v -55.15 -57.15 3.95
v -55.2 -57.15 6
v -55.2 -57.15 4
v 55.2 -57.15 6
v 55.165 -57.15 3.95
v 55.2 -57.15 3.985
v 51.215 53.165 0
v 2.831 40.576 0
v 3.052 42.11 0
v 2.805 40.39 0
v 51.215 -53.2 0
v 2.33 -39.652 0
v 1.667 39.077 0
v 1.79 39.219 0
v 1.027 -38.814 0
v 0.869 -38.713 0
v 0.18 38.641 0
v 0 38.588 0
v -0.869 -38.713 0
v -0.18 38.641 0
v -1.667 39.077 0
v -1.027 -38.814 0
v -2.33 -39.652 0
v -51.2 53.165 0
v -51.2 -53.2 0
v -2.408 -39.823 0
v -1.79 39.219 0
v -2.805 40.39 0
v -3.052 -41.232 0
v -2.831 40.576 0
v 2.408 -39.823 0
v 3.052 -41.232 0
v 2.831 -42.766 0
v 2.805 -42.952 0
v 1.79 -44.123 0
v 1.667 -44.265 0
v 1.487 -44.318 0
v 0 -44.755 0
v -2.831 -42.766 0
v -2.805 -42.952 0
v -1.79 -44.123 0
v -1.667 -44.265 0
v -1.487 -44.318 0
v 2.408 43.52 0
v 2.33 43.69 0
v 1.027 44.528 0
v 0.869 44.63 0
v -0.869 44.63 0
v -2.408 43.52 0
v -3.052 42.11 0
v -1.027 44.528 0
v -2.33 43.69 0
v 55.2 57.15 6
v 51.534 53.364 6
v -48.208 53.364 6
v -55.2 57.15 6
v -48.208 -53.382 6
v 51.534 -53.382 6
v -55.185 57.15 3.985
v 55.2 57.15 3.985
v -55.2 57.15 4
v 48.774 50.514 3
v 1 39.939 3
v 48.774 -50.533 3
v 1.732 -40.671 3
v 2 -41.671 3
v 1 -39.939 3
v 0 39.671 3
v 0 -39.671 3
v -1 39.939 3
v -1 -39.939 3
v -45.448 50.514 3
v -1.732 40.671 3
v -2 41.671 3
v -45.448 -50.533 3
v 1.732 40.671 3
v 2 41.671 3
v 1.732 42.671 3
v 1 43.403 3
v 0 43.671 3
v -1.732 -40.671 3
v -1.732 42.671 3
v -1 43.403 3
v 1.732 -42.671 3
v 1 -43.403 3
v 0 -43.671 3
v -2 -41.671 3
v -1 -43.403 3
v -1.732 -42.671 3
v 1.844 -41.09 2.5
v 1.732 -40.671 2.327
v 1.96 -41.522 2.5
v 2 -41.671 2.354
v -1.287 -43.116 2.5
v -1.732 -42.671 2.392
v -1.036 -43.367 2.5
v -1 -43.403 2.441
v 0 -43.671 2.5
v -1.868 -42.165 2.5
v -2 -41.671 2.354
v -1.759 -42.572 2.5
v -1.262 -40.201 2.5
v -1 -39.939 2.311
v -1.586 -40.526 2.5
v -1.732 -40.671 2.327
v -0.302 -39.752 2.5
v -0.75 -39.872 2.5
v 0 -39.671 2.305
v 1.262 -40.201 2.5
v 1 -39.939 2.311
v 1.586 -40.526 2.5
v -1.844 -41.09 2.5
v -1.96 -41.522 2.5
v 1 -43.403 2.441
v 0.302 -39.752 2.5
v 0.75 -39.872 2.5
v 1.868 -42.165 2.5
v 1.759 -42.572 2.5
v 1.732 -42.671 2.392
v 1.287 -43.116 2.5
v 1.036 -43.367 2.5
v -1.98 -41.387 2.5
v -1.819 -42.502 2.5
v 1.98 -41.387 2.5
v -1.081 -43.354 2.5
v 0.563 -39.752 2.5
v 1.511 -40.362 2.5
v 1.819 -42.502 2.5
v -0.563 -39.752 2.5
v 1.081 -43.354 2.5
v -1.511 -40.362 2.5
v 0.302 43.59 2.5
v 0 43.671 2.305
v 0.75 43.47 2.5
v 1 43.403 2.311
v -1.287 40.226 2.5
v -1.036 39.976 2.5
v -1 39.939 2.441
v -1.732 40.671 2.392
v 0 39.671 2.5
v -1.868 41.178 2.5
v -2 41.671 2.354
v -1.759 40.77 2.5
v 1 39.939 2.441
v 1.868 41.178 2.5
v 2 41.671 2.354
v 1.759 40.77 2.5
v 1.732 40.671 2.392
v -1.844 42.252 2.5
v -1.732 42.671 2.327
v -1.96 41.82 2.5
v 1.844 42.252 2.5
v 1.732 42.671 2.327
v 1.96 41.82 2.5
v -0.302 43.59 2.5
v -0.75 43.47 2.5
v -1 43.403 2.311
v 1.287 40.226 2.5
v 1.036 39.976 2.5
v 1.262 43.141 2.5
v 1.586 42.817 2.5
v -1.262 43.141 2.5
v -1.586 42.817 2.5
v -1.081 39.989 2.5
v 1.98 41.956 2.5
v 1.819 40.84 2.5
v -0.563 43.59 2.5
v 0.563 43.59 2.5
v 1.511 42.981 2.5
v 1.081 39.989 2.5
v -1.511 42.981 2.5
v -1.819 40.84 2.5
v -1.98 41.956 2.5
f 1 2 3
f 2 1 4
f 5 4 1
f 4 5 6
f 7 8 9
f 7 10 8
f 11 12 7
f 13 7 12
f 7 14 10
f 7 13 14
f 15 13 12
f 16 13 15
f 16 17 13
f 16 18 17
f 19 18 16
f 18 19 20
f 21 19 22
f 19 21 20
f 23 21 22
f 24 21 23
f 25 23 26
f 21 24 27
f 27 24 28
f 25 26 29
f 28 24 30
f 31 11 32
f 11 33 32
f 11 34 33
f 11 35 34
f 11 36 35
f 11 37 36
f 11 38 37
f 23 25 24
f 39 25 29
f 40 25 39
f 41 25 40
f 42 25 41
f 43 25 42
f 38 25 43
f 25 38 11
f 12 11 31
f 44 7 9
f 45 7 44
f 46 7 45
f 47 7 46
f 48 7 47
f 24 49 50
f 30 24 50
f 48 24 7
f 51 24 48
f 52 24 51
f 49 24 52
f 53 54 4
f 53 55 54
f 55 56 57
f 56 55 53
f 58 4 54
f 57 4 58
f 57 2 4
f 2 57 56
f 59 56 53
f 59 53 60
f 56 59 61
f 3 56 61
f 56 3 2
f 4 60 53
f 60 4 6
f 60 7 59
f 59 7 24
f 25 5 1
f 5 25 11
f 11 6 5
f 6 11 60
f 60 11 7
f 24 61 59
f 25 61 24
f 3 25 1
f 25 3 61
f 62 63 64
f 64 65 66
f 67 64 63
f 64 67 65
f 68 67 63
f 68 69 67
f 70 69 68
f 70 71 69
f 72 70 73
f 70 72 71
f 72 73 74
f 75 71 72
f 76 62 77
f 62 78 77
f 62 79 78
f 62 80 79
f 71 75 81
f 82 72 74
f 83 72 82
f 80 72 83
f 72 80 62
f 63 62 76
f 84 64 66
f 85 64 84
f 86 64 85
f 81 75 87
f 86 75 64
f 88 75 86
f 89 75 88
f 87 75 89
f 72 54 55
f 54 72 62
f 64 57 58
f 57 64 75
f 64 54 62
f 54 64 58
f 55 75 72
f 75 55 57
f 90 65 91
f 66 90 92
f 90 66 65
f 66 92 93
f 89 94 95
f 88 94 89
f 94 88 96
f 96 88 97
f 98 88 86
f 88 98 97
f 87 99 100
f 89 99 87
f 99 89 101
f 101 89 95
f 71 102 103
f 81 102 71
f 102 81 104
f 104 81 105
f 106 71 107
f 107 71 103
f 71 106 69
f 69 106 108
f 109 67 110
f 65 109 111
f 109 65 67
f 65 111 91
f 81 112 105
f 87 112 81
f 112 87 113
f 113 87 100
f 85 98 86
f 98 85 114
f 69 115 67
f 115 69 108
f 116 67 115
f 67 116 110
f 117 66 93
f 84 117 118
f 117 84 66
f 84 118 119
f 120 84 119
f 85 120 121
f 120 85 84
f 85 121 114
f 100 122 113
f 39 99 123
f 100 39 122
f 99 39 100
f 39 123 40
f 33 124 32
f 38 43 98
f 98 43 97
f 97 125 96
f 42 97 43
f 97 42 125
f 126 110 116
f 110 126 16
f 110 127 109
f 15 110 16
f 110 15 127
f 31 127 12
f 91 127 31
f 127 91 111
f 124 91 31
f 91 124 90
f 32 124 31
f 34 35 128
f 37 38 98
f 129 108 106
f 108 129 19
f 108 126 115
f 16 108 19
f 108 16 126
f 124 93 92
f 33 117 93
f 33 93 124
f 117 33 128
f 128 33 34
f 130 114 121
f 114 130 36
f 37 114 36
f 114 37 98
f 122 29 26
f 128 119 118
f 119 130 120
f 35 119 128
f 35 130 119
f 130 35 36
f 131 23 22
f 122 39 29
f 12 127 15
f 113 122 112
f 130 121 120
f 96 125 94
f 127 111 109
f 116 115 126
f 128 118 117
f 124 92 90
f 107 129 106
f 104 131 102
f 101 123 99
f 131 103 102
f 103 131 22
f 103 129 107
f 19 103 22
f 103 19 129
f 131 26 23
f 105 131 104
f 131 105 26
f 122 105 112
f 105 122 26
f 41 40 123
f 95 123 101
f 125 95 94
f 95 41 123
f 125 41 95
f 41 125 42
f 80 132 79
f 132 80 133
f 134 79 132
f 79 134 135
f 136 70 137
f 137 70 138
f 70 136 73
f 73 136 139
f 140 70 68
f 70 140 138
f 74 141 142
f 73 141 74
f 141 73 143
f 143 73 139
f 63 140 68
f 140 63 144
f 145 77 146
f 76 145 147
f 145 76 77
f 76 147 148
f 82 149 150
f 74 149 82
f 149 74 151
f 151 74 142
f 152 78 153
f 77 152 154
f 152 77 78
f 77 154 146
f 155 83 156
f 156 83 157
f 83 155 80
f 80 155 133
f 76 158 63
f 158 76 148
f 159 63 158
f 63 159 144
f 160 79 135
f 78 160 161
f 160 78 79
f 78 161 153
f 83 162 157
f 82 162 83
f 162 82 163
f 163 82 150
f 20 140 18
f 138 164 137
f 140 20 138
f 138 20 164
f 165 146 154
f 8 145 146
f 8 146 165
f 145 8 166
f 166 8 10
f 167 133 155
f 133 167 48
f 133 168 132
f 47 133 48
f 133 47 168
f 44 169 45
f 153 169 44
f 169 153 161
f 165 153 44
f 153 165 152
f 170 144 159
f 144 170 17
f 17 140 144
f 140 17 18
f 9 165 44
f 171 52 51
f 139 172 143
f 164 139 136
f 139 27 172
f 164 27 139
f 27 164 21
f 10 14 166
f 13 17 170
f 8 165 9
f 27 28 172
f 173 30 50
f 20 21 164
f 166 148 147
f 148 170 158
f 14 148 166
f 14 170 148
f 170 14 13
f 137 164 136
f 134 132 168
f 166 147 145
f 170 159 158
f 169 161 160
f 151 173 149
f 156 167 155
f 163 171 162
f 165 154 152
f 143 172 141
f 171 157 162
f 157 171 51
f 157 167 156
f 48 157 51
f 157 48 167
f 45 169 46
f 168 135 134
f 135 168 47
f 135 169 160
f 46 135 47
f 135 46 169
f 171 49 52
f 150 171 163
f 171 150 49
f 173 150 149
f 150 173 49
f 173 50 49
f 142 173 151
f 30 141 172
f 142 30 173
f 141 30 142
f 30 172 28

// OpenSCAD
// WALLY - Wall Plate Customizer v1.3
// by TheNewHobbyist 2013 (http://thenewhobbyist.com)
// http://www.thingiverse.com/thing:47956
//
// Most of the connectors used with this thing are panel mount connectors from
// www.DataPro.net I can't vouch for their quality but they did have easy to
// find dimensions for their products so I used them.
//
// This could be tightened up considerably but I thought I'd get it out there for people
// to experiment with before I lose my mind staring at it too long. Also this is my
// first OpenSCAD model so cut me some slack ;)
//
//   Notes:
//
// * The plug types "Duplex Outlet", "Long_Toggle Switch", "Toggle Switch", and "Rocker"
//   will all use the entire plate when selected in top or bottom configuration. The
//   other selection (if not "none" will be selected.
//
// * "None" and "Blank should not be considered equal. if "None" is selected for one of
//   the two holes on a plate the other selection will be centered on that plate. If
//   "Blank" is selected that plug location will remain blank but the other selection
//   will NOT move into a centered position.
//
//	Change Log:
//
//	v1.1
//	UPDATED: Screw hole locations for designer and toggle plate types.
//	UPDATED: Hole size for designer plate type.
//	UPDATED: Outlet hole spacing
//
//	v1.2
//	ADDED: Long Toggle Switch for laird
//
//	v1.3
//	ADDED: 3 new sizes for plate export: Standard, Junior-Jumbo, and Jumbo.
//

  //////////////////////////
 // Customizer Settings: //
//////////////////////////

//How big are we talkin' here?
plate_width = 1; //	[1:5]

// Bigger hole in your wall? Try this
plate_size = 0; // [0:Standard, 1:Junior-Jumbo, 2:Jumbo,]

//Pick a plug or full plate type
1st_plate = "none";  //	["none":None, "blank":Blank Port, "toggle":Full Plate - Toggle Switch, "long_toggle":Full Plate - Long Toggle Switch, "outlet":Full Plate - Duplex Outlet, "rocker":Full Plate - Rocker/Designer Plate, "keystone1":Keystone Jack, "vga":VGA Port, "hdmi":HDMI Port, "dvi":DVI-I Port, "displayport":Displayport, "cat5e":Cat5e/Cat6 Port, "usb-a":USB-A Port, "usb-b":USB-B Port, "firewire":Firewire IEEE 1394 Port, "db09":DB-09 Port, "ps2":PS2 Port, "f-type": F-Type/Coaxial Port,"svideo":S-Video Port, "stereo":Stereo Headphone Jack]
//Pick a bottom plug type or leave as none
1st_plate_bottom_hole = "none";  //	["none":None, "blank":Blank Port, "keystone1":Keystone Jack, "vga":VGA Port, "hdmi":HDMI Port, "dvi":DVI-I Port, "displayport":Displayport, "cat5e":Cat5e/Cat6 Port, "usb-a":USB-A Port, "usb-b":USB-B Port, "firewire":Firewire IEEE 1394 Port, "db09":DB-09 Port, "ps2":PS2 Port, "f-type": F-Type/Coaxial Port,"svideo":S-Video Port, "stereo":Stereo Headphone Jack]
//Pick a plug or full plate type
2nd_plate = "none";  //	["none":None, "blank":Blank Port, "toggle":Full Plate - Toggle Switch, "long_toggle":Full Plate - Long Toggle Switch, "outlet":Full Plate - Duplex Outlet, "rocker":Full Plate - Rocker/Designer Plate, "keystone1":Keystone Jack, "vga":VGA Port, "hdmi":HDMI Port, "dvi":DVI-I Port, "displayport":Displayport, "cat5e":Cat5e/Cat6 Port, "usb-a":USB-A Port, "usb-b":USB-B Port, "firewire":Firewire IEEE 1394 Port, "db09":DB-09 Port, "ps2":PS2 Port, "f-type": F-Type/Coaxial Port,"svideo":S-Video Port, "stereo":Stereo Headphone Jack]
//Pick a bottom plug type or leave as none
2nd_plate_bottom_hole = "none";  //	["none":None, "blank":Blank Port, "keystone1":Keystone Jack, "vga":VGA Port, "hdmi":HDMI Port, "dvi":DVI-I Port, "displayport":Displayport, "cat5e":Cat5e/Cat6 Port, "usb-a":USB-A Port, "usb-b":USB-B Port, "firewire":Firewire IEEE 1394 Port, "db09":DB-09 Port, "ps2":PS2 Port, "f-type": F-Type/Coaxial Port,"svideo":S-Video Port, "stereo":Stereo Headphone Jack]
//Pick a plug or full plate type
3rd_plate = "none";  //	["none":None, "blank":Blank Port, "toggle":Full Plate - Toggle Switch, "long_toggle":Full Plate - Long Toggle Switch, "outlet":Full Plate - Duplex Outlet, "rocker":Full Plate - Rocker/Designer Plate, "keystone1":Keystone Jack, "vga":VGA Port, "hdmi":HDMI Port, "dvi":DVI-I Port, "displayport":Displayport, "cat5e":Cat5e/Cat6 Port, "usb-a":USB-A Port, "usb-b":USB-B Port, "firewire":Firewire IEEE 1394 Port, "db09":DB-09 Port, "ps2":PS2 Port, "f-type": F-Type/Coaxial Port,"svideo":S-Video Port, "stereo":Stereo Headphone Jack]
//Pick a bottom plug type or leave as none
3rd_plate_bottom_hole = "none";  //	["none":None, "blank":Blank Port, "keystone1":Keystone Jack, "vga":VGA Port, "hdmi":HDMI Port, "dvi":DVI-I Port, "displayport":Displayport, "cat5e":Cat5e/Cat6 Port, "usb-a":USB-A Port, "usb-b":USB-B Port, "firewire":Firewire IEEE 1394 Port, "db09":DB-09 Port, "ps2":PS2 Port, "f-type": F-Type/Coaxial Port,"svideo":S-Video Port, "stereo":Stereo Headphone Jack]
//Pick a plug or full plate type
4th_plate = "none";  //["none":None, "blank":Blank Port, "toggle":Full Plate - Toggle Switch, "long_toggle":Full Plate - Long Toggle Switch, "outlet":Full Plate - Duplex Outlet, "rocker":Full Plate - Rocker/Designer Plate, "keystone1":Keystone Jack, "vga":VGA Port, "hdmi":HDMI Port, "dvi":DVI-I Port, "displayport":Displayport, "cat5e":Cat5e/Cat6 Port, "usb-a":USB-A Port, "usb-b":USB-B Port, "firewire":Firewire IEEE 1394 Port, "db09":DB-09 Port, "ps2":PS2 Port, "f-type": F-Type/Coaxial Port,"svideo":S-Video Port, "stereo":Stereo Headphone Jack]
//Pick a bottom plug type or leave as none
4th_plate_bottom_hole = "none";  //	["none":None, "blank":Blank Port, "keystone1":Keystone Jack, "vga":VGA Port, "hdmi":HDMI Port, "dvi":DVI-I Port, "displayport":Displayport, "cat5e":Cat5e/Cat6 Port, "usb-a":USB-A Port, "usb-b":USB-B Port, "firewire":Firewire IEEE 1394 Port, "db09":DB-09 Port, "ps2":PS2 Port, "f-type": F-Type/Coaxial Port,"svideo":S-Video Port, "stereo":Stereo Headphone Jack]
//Pick a plug or full plate type
5th_plate = "none";  //["none":None, "blank":Blank Port, "toggle":Full Plate - Toggle Switch, "long_toggle":Full Plate - Long Toggle Switch, "outlet":Full Plate - Duplex Outlet, "rocker":Full Plate - Rocker/Designer Plate, "keystone1":Keystone Jack, "vga":VGA Port, "hdmi":HDMI Port, "dvi":DVI-I Port, "displayport":Displayport, "cat5e":Cat5e/Cat6 Port, "usb-a":USB-A Port, "usb-b":USB-B Port, "firewire":Firewire IEEE 1394 Port, "db09":DB-09 Port, "ps2":PS2 Port, "f-type": F-Type/Coaxial Port,"svideo":S-Video Port, "stereo":Stereo Headphone Jack]
//Pick a bottom plug type or leave as none
5th_plate_bottom_hole = "none";  //	["none":None, "blank":Blank Port, "keystone1":Keystone Jack, "vga":VGA Port, "hdmi":HDMI Port, "dvi":DVI-I Port, "displayport":Displayport, "cat5e":Cat5e/Cat6 Port, "usb-a":USB-A Port, "usb-b":USB-B Port, "firewire":Firewire IEEE 1394 Port, "db09":DB-09 Port, "ps2":PS2 Port, "f-type": F-Type/Coaxial Port,"svideo":S-Video Port, "stereo":Stereo Headphone Jack]

  //////////////////////
 // Static Settings: //
//////////////////////

module GoAwayCustomizer() {
// This module is here to stop Customizer from picking up the variables below
}

l_offset = [55.2,39.6875,44.45];//34.925,39.6875
r_offset = [55.2,39.6875,44.45];
spacer = [0,0,46.0375,92.075,138.1125,184.15];
solid_plate_width = l_offset[plate_size] + spacer[plate_width] + r_offset[plate_size];//!!!!plate width squeaspacer[plate_width*2] r!!!!!

height_sizes = [114.3,123.825,133.35];

height =114.3 ; //plate height (static)114.3
gang_width=[0,69.86,115.824,161.925,206.375,254]; // Plate widths (standard)69.86

edgewidth = solid_plate_width + 10; // Bevel setting for top and bottom
rightbevel = solid_plate_width -4; // Bevel for right side (scales)

left_offset = 34.925; // Offset first hole position34.925
switch_offset = 46.0375; // Offset all additional holes
thinner_offset=[0,0.92,0.95,0.96,0.97,0.973]; // Manual fix for right side wackiness

positions=[height_sizes[plate_size]/2,height_sizes[plate_size]/2 - 14.25,height_sizes[plate_size]/2 + 14.25];

// preview[view:north, tilt:bottom]

  ///////////////////
 // Hole Control: //
///////////////////

module plate1(){
	if (1st_plate == "toggle" || 1st_plate_bottom_hole == "toggle"){
		translate([0,l_offset[plate_size],0]) toggle_screws();
		translate([0,l_offset[plate_size],0]) hole("toggle");
		}
	else if (1st_plate == "long_toggle" || 1st_plate_bottom_hole == "long_toggle"){
		translate([0,l_offset[plate_size],0]) toggle_screws();
		translate([0,l_offset[plate_size],0]) hole("long_toggle");
		}
	else if (1st_plate == "rocker" || 1st_plate_bottom_hole == "rocker"){
		translate([0,l_offset[plate_size],0]) rocker_screws();
		translate([0,l_offset[plate_size],0]) hole("rocker");
		}
	else if (1st_plate == "outlet" || 1st_plate_bottom_hole == "outlet") {
	translate([0,l_offset[plate_size],0]) hole("outlet");
	}
	else if (1st_plate_bottom_hole == "none") {
		translate([0,l_offset[plate_size],0]) box_screws();
		translate([positions[0],l_offset[plate_size],0]) hole(1st_plate);
			}
	else if (1st_plate == "none") {
		translate([0,l_offset[plate_size],0]) box_screws();
		translate([positions[0],l_offset[plate_size],0]) hole(1st_plate_bottom_hole);
			}
	else {
	translate([0,l_offset[plate_size],0]) box_screws();
	translate([positions[1],l_offset[plate_size],0]) hole(1st_plate);
	translate([positions[2],l_offset[plate_size],0]) hole(1st_plate_bottom_hole);
	}
}

module plate2(){
	if (2nd_plate == "toggle" || 2nd_plate_bottom_hole == "toggle"){
		translate([0,l_offset[plate_size] + switch_offset,0]) toggle_screws();
		translate([0,l_offset[plate_size] + switch_offset,0]) hole("toggle");
		}
	else if (2nd_plate == "long_toggle" || 2nd_plate_bottom_hole == "long_toggle"){
		translate([0,l_offset[plate_size] + switch_offset,0]) toggle_screws();
		translate([0,l_offset[plate_size] + switch_offset,0]) hole("long_toggle");
		}
	else if (2nd_plate == "rocker" || 2nd_plate_bottom_hole == "rocker"){
		translate([0,l_offset[plate_size] + switch_offset,0]) rocker_screws();
		translate([0,l_offset[plate_size] + switch_offset,0]) hole("rocker");
		}
	else if (2nd_plate == "outlet" || 2nd_plate_bottom_hole == "outlet") {
	translate([0,l_offset[plate_size] + switch_offset,0]) hole("outlet");
	}
	else if (2nd_plate_bottom_hole == "none") {
		translate([0,l_offset[plate_size] + switch_offset,0]) box_screws();
		translate([positions[0],l_offset[plate_size] + switch_offset,0]) hole(2nd_plate);
			}
	else if (2nd_plate == "none") {
		translate([0,l_offset[plate_size] + switch_offset,0]) box_screws();
		translate([positions[0],l_offset[plate_size] + switch_offset,0]) hole(2nd_plate_bottom_hole);
			}
	else {
	translate([0,l_offset[plate_size] + switch_offset,0]) box_screws();
	translate([positions[1],l_offset[plate_size] + switch_offset,0]) hole(2nd_plate);
	translate([positions[2],l_offset[plate_size] + switch_offset,0]) hole(2nd_plate_bottom_hole);
	}
}

module plate3(){
	if (3rd_plate == "toggle" || 3rd_plate_bottom_hole == "toggle"){
		translate([0,l_offset[plate_size] + switch_offset * 2,0]) toggle_screws();
		translate([0,l_offset[plate_size] + switch_offset * 2,0]) hole("toggle");
		}
	else if (3rd_plate == "long_toggle" || 3rd_plate_bottom_hole == "long_toggle"){
		translate([0,l_offset[plate_size] + switch_offset * 2,0]) toggle_screws();
		translate([0,l_offset[plate_size] + switch_offset * 2,0]) hole("long_toggle");
		}
	else if (3rd_plate == "rocker" || 3rd_plate_bottom_hole == "rocker"){
		translate([0,l_offset[plate_size] + switch_offset * 2,0]) rocker_screws();
		translate([0,l_offset[plate_size] + switch_offset * 2,0]) hole("rocker");
		}
	else if (3rd_plate == "outlet" || 3rd_plate_bottom_hole == "outlet") {
	translate([0,l_offset[plate_size] + switch_offset * 2,0]) hole("outlet");
	}
	else if (3rd_plate_bottom_hole == "none") {
		translate([0,l_offset[plate_size] + switch_offset * 2,0]) box_screws();
		translate([positions[0],l_offset[plate_size] + switch_offset * 2,0]) hole(3rd_plate);
			}
	else if (3rd_plate == "none") {
		translate([0,l_offset[plate_size] + switch_offset * 2,0]) box_screws();
		translate([positions[0],l_offset[plate_size] + switch_offset * 2,0]) hole(3rd_plate_bottom_hole);
			}
	else {
	translate([0,l_offset[plate_size] + switch_offset * 2,0]) box_screws();
	translate([positions[1],l_offset[plate_size] + switch_offset * 2,0]) hole(3rd_plate);
	translate([positions[2],l_offset[plate_size] + switch_offset * 2,0]) hole(3rd_plate_bottom_hole);
	}
}

module plate4(){
	if (4th_plate == "toggle" || 4th_plate_bottom_hole == "toggle"){
		translate([0,l_offset[plate_size] + switch_offset * 3,0]) toggle_screws();
		translate([0,l_offset[plate_size] + switch_offset * 3,0]) hole("toggle");
		}
	else if (4th_plate == "long_toggle" || 4th_plate_bottom_hole == "long_toggle"){
		translate([0,l_offset[plate_size] + switch_offset * 3,0]) toggle_screws();
		translate([0,l_offset[plate_size] + switch_offset * 3,0]) hole("long_toggle");
		}
	else if (4th_plate == "rocker" || 4th_plate_bottom_hole == "rocker"){
		translate([0,l_offset[plate_size] + switch_offset * 3,0]) rocker_screws();
		translate([0,l_offset[plate_size] + switch_offset * 3,0]) hole("rocker");
		}
	else if (4th_plate == "outlet" || 4th_plate_bottom_hole == "outlet") {
	translate([0,l_offset[plate_size] + switch_offset * 3,0]) hole("outlet");
	}
	else if (4th_plate_bottom_hole == "none") {
		translate([0,l_offset[plate_size] + switch_offset * 3,0]) box_screws();
		translate([positions[0],l_offset[plate_size] + switch_offset * 3,0]) hole(4th_plate);
			}
	else if (4th_plate == "none") {
		translate([0,l_offset[plate_size] + switch_offset * 3,0]) box_screws();
		translate([positions[0],l_offset[plate_size] + switch_offset * 3,0]) hole(4th_plate_bottom_hole);
			}
	else {
	translate([0,l_offset[plate_size] + switch_offset * 3,0]) box_screws();
	translate([positions[1],l_offset[plate_size] + switch_offset * 3,0]) hole(4th_plate);
	translate([positions[2],l_offset[plate_size] + switch_offset * 3,0]) hole(4th_plate_bottom_hole);
	}
}

module plate5(){
	if (5th_plate == "toggle" || 5th_plate_bottom_hole == "toggle"){
		translate([0,l_offset[plate_size] + switch_offset * 4,0]) toggle_screws();
		translate([0,l_offset[plate_size] + switch_offset * 4,0]) hole("toggle");
		}
	else if (5th_plate == "long_toggle" || 5th_plate_bottom_hole == "long_toggle"){
		translate([0,l_offset[plate_size] + switch_offset * 4,0]) toggle_screws();
		translate([0,l_offset[plate_size] + switch_offset * 4,0]) hole("long_toggle");
		}
	else if (5th_plate == "rocker" || 5th_plate_bottom_hole == "rocker"){
		translate([0,l_offset[plate_size] + switch_offset * 4,0]) rocker_screws();
		translate([0,l_offset[plate_size] + switch_offset * 4,0]) hole("rocker");
		}
	else if (5th_plate == "outlet" || 5th_plate_bottom_hole == "outlet") {
	translate([0,l_offset[plate_size] + switch_offset * 4,0]) hole("outlet");
	}
	else if (5th_plate_bottom_hole == "none") {
		translate([0,l_offset[plate_size] + switch_offset * 4,0]) box_screws();
		translate([positions[0],l_offset[plate_size] + switch_offset * 4,0]) hole(5th_plate);
			}
	else if (5th_plate == "none") {
		translate([0,l_offset[plate_size] + switch_offset * 4,0]) box_screws();
		translate([positions[0],l_offset[plate_size] + switch_offset * 4,0]) hole(5th_plate_bottom_hole);
			}
	else {
	translate([0,l_offset[plate_size] + switch_offset * 4,0]) box_screws();
	translate([positions[1],l_offset[plate_size] + switch_offset * 4,0]) hole(5th_plate);
	translate([positions[2],l_offset[plate_size] + switch_offset * 4,0]) hole(5th_plate_bottom_hole);
	}
}

  /////////////////
 // SolidWorks: //
/////////////////

module plate1_solid(){
if (1st_plate == "keystone1" && 1st_plate_bottom_hole == "none") {
	translate([height_sizes[plate_size]/2 + 14.3,l_offset[plate_size] - 11.5,-3.9]) hole("keystone_solid");
	}
else if (1st_plate == "keystone1" && 1st_plate_bottom_hole != "outlet" && 1st_plate_bottom_hole != "toggle" && 1st_plate_bottom_hole != "rocker") {
	translate([height_sizes[plate_size]/2,l_offset[plate_size] - 11.5,-3.9]) hole("keystone_solid");
	}
if (1st_plate_bottom_hole == "keystone1" && 1st_plate == "none") {
	translate([height_sizes[plate_size]/2 + 14.3,l_offset[plate_size] - 11.5,-3.9]) hole("keystone_solid");
	}
else if (1st_plate_bottom_hole == "keystone1" && 1st_plate != "outlet" && 1st_plate != "toggle" && 1st_plate != "rocker") {
	translate([height_sizes[plate_size]/2 + 28.5,l_offset[plate_size] - 11.5,-3.9]) hole("keystone_solid");
	}

}

module plate2_solid(){
if (2nd_plate == "keystone1" && 2nd_plate_bottom_hole == "none") {
	translate([height_sizes[plate_size]/2 + 14.3,l_offset[plate_size] - 11.5 + switch_offset,-3.9]) hole("keystone_solid");
	}
else if (2nd_plate == "keystone1" && 2nd_plate_bottom_hole != "outlet" && 2nd_plate_bottom_hole != "toggle" && 2nd_plate_bottom_hole != "rocker") {
	translate([height_sizes[plate_size]/2,l_offset[plate_size] - 11.5 + switch_offset,-3.9]) hole("keystone_solid");
	}
if (2nd_plate_bottom_hole == "keystone1" && 2nd_plate == "none") {
	translate([height_sizes[plate_size]/2 + 14.3,l_offset[plate_size] - 11.5 + switch_offset,-3.9]) hole("keystone_solid");
	}
else if (2nd_plate_bottom_hole == "keystone1" && 2nd_plate != "outlet" && 2nd_plate != "toggle" && 2nd_plate != "rocker") {
	translate([height_sizes[plate_size]/2 + 28.5,l_offset[plate_size] - 11.5 + switch_offset,-3.9]) hole("keystone_solid");
	}

}

module plate3_solid(){
if (3rd_plate == "keystone1" && 3rd_plate_bottom_hole == "none") {
	translate([height_sizes[plate_size]/2 + 14.3,l_offset[plate_size] - 11.5 + switch_offset * 2,-3.9]) hole("keystone_solid");
	}
else if (3rd_plate == "keystone1" && 3rd_plate_bottom_hole != "outlet" && 3rd_plate_bottom_hole != "toggle" && 3rd_plate_bottom_hole != "rocker") {
	translate([height_sizes[plate_size]/2,l_offset[plate_size] - 11.5 + switch_offset * 2,-3.9]) hole("keystone_solid");
	}
if (3rd_plate_bottom_hole == "keystone1" && 3rd_plate == "none") {
	translate([height_sizes[plate_size]/2 + 14.3,l_offset[plate_size] - 11.5 + switch_offset * 2,-3.9]) hole("keystone_solid");
	}
else if (3rd_plate_bottom_hole == "keystone1" && 3rd_plate != "outlet" && 3rd_plate != "toggle" && 3rd_plate != "rocker") {
	translate([height_sizes[plate_size]/2 + 28.5,l_offset[plate_size] - 11.5 + switch_offset * 2,-3.9]) hole("keystone_solid");
	}

}

module plate4_solid(){
if (4th_plate == "keystone1" && 4th_plate_bottom_hole == "none") {
	translate([height_sizes[plate_size]/2 + 14.3,l_offset[plate_size] - 11.5 + switch_offset * 3,-3.9]) hole("keystone_solid");
	}
else if (4th_plate == "keystone1" && 4th_plate_bottom_hole != "outlet" && 4th_plate_bottom_hole != "toggle" && 4th_plate_bottom_hole != "rocker") {
	translate([height_sizes[plate_size]/2,l_offset[plate_size] - 11.5 + switch_offset * 3,-3.9]) hole("keystone_solid");
	}
if (4th_plate_bottom_hole == "keystone1" && 4th_plate == "none") {
	translate([height_sizes[plate_size]/2 + 14.3,l_offset[plate_size] - 11.5 + switch_offset * 3,-3.9]) hole("keystone_solid");
	}
else if (4th_plate_bottom_hole == "keystone1" && 4th_plate != "outlet" && 4th_plate != "toggle" && 4th_plate != "rocker") {
	translate([height_sizes[plate_size]/2 + 28.5,l_offset[plate_size] - 11.5 + switch_offset * 3,-3.9]) hole("keystone_solid");
	}

}

module plate5_solid(){
if (5th_plate == "keystone1" && 5th_plate_bottom_hole == "none") {
	translate([height_sizes[plate_size]/2 + 14.3,l_offset[plate_size] - 11.5 + switch_offset * 4,-3.9]) hole("keystone_solid");
	}
else if (5th_plate == "keystone1" && 5th_plate_bottom_hole != "outlet" && 5th_plate_bottom_hole != "toggle" && 5th_plate_bottom_hole != "rocker") {
	translate([height_sizes[plate_size]/2,l_offset[plate_size] - 11.5 + switch_offset * 4,-3.9]) hole("keystone_solid");
	}
if (5th_plate_bottom_hole == "keystone1" && 5th_plate == "none") {
	translate([height_sizes[plate_size]/2 + 14.3,l_offset[plate_size] - 11.5 + switch_offset * 4,-3.9]) hole("keystone_solid");
	}
else if (5th_plate_bottom_hole == "keystone1" && 5th_plate != "outlet" && 5th_plate != "toggle" && 5th_plate != "rocker") {
	translate([height_sizes[plate_size]/2 + 28.5,l_offset[plate_size] - 11.5 + switch_offset * 4,-3.9]) hole("keystone_solid");
	}

}

  ///////////////////
 // PlateStation: //
///////////////////

//Plate size and bevel
module plate() {
	difference() {
		cube([height_sizes[plate_size],solid_plate_width,6]);//solid_plate_width
		translate([-4.3,-5,6.2]) rotate([0,45,0]) cube([6,edgewidth,6]); //Top Bevel
		translate([height_sizes[plate_size]-4.2,-5,6.25]) rotate([0,45,0]) cube([6,edgewidth,6]); //Bottom Bevel
		translate([height_sizes[plate_size]+10,-4.4,6.1]) rotate([0,45,90]) cube([6,height_sizes[plate_size]+20,6]); //Left Bevel (doesn't change)
		translate([height_sizes[plate_size]+10,rightbevel,6]) rotate([0,45,90]) cube([6,height_sizes[plate_size]+10,6]); //Right Bevel (scales right)
				}
			}


// Thinning Plate
module plate_inner() {
	scale([0.95,thinner_offset[plate_width],1]){
	translate([3,3,0]){
	difference() {
		cube([height_sizes[plate_size],solid_plate_width,6]);
		translate([-4.3,-5,6.2]) rotate([0,45,0]) cube([6,edgewidth,6]); //Top Bevel
		translate([height_sizes[plate_size]-4.2,-5,6.25]) rotate([0,45,0]) cube([6,edgewidth,6]); //Bottom Bevel
		translate([height_sizes[plate_size]+10,-4.4,6.1]) rotate([0,45,90]) cube([6,height_sizes[plate_size]+20,6]); //Left Bevel (doesn't change)
		translate([height_sizes[plate_size]+10,rightbevel,6]) rotate([0,45,90]) cube([6,height_sizes[plate_size]+10,6]); //Right Bevel (scales right)
				}
			}
		}
	}

// Box screw holes
module box_screws(){
	 translate([height_sizes[plate_size]/2 + 41.67125,0,-1]) cylinder(r=2, h=10, $fn=12);//23 position of holes
	 translate([height_sizes[plate_size]/2 + 41.67125,0,3.5]) cylinder(r1=2, r2=3.3, h=3);
	 translate([height_sizes[plate_size]/2 - 41.67125,0,-1]) cylinder(r=2, h=10, $fn=12);
	 translate([height_sizes[plate_size]/2 - 41.67125,0,3.5]) cylinder(r1=2, r2=3.3, h=3);
}

// Rocker/Designer screw holes
module rocker_screws(){
	 translate([height_sizes[plate_size]/2 + 48.41875,0,-1]) cylinder(r=2, h=10, $fn=12);
	 translate([height_sizes[plate_size]/2 + 48.41875,0,3.5]) cylinder(r1=2, r2=3.3, h=3);
	 translate([height_sizes[plate_size]/2 - 48.41875,0,-1]) cylinder(r=2, h=10, $fn=12);
	 translate([height_sizes[plate_size]/2 - 48.41875,0,3.5]) cylinder(r1=2, r2=3.3, h=3);
}

// Toggle screw holes
module toggle_screws(){
	 translate([height_sizes[plate_size]/2 + 30.1625,0,-1]) cylinder(r=2, h=10, $fn=12);
	 translate([height_sizes[plate_size]/2 + 30.1625,0,3.5]) cylinder(r1=2, r2=3.3, h=3);
	 translate([height_sizes[plate_size]/2 - 30.1625,0,-1]) cylinder(r=2, h=10, $fn=12);
	 translate([height_sizes[plate_size]/2 - 30.1625,0,3.5]) cylinder(r1=2, r2=3.3, h=3);
}

  ///////////////
 // Portland: //
///////////////

// Hole Cutout definitions
module hole(hole_type) {


// Toggle switch hole
	if (hole_type == "toggle") {
		translate([height_sizes[plate_size]/2,0,0]) cube([23.8125,10.3188,15], center = true);
		 						}

// Toggle switch hole and screw holes
	if (hole_type == "long_toggle") {
		translate([height_sizes[plate_size]/2,0,0]) cube([43.6563,11.9063,15], center = true);
		 						}

// Rocker switch plate
	if (hole_type == "rocker") {
		translate([height_sizes[plate_size]/2,0,0]) cube([67.1,33.3,15], center = true);

		 						}

// Duplex power outlet plate or dual side toggles
	if (hole_type == "outlet" || hole_type == "dualsidetoggle") {
		translate([height_sizes[plate_size]/2 + 19.3915,0,0]) {
			difference() {
				cylinder(r=17.4625, h=15, center = true);
				translate([-24.2875,-15,-2]) cube([10,37,15], center = false);
				translate([14.2875,-15,-2]) cube([10,37,15], center = false);
								}
							}
		translate([height_sizes[plate_size]/2 - 19.3915,0,0]){
			difference(){
				cylinder(r=17.4625, h=15, center = true);
				translate([-24.2875,-15,-2]) cube([10,37,15], center = false);
				translate([14.2875,-15,-2]) cube([10,37,15], center = false);
								}
							}
		translate([height_sizes[plate_size]/2,0,-1]) cylinder(r=2, h=10);
		translate([height_sizes[plate_size]/2,0,3.5]) cylinder(r1=2, r2=3.3, h=3);
							}

// Blank plate
	if (hole_type == "blank") { }

// VGA & DB09 plate
// VGA Fits http://www.datapro.net/products/vga-dual-panel-mount-f-f-cable.html
// DB09 Fits http://www.datapro.net/products/db9-serial-panel-mount-male-extension.html
	if (hole_type == "vga" || hole_type == "db09") {

			translate([0,-12.5,3]) cylinder(r=1.75, h=10, center = true);
			translate([0,12.5,3]) cylinder(r=1.75, h=10, center = true);
				difference(){
					cube([10,19,13], center=true);
					translate([-5,-9.2,1]) rotate([0,0,-35.6]) cube([4.4,2.4,15], center=true);
					translate([.9,-11.2,0]) rotate([0,0,9.6]) cube([10,4.8,15], center=true);
					translate([4.6,-8.5,0]) rotate([0,0,37.2]) cube([4.4,2.4,15], center=true);
					translate([-5,9.2,1]) rotate([0,0,35.6]) cube([4.4,2.4,15], center=true);
					translate([0.9,11.2,0]) rotate([0,0,-9.6]) cube([10,4.8,15], center=true);
					translate([4.6,8.5,0]) rotate([0,0,-37.2]) cube([4.4,2.4,15], center=true);
								}
						}

// HDMI plate
// Fits http://www.datapro.net/products/hdmi-panel-mount-extension-cable.html
	if (hole_type == "hdmi") {
		translate([0,-13,3]) cylinder(r=1.75, h=10, center = true);
		translate([0,13,3]) cylinder(r=1.75, h=10, center = true);
		translate([0,0,3]) cube([6,16,10], center=true);
							}

// DVI-I plate
// Fits http://www.datapro.net/products/dvi-i-panel-mount-extension-cable.html
	if (hole_type == "dvi") {
		translate([0,-16,3]) cylinder(r=1.75, h=10, center = true);
		translate([0,16,3]) cylinder(r=1.75, h=10, center = true);
		translate([0,0,3]) cube([10,26,10], center=true);
							}

// DisplayPort plate
// Fits http://www.datapro.net/products/dvi-i-panel-mount-extension-cable.html
	if (hole_type == "displayport") {
		translate([0,-13.5,3]) cylinder(r=1.75, h=10, center = true);
		translate([0,13.5,3]) cylinder(r=1.75, h=10, center = true);
		translate([0,0,0]){
			difference(){
				translate([0,0,3]) cube([7,19,10], center=true);
				translate([2.47,-9.37,3]) rotate([0,0,-54.6]) cube([3,5,14], center=true);
						}
								}
									}

// USB-A Plate
// Fits http://www.datapro.net/products/usb-panel-mount-type-a-cable.html
	if (hole_type == "usb-a") {
		translate([0,-15,3]) cylinder(r=1.75, h=10, center = true);
		translate([0,15,3]) cylinder(r=1.75, h=10, center = true);
		translate([0,0,3]) cube([8,16,10], center=true);
							}

// USB-B Plate
// Fits http://www.datapro.net/products/usb-panel-mount-type-b-cable.html
	if (hole_type == "usb-b") {
		translate([0,-13,3]) cylinder(r=1.75, h=10, center = true);
		translate([0,13,3]) cylinder(r=1.75, h=10, center = true);
		translate([0,0,3]) cube([11,12,10], center=true);
							}

// 1394 Firewire Plate
// Fits http://www.datapro.net/products/firewire-panel-mount-extension.html
	if (hole_type == "firewire") {
		translate([0,-13.5,3]) cylinder(r=1.75, h=10, center = true);
		translate([0,13.5,3]) cylinder(r=1.75, h=10, center = true);
		translate([0,0,3]) cube([7,12,10], center=true);
							}

// F-Type / Cable TV Plate
// Fits http://www.datapro.net/products/f-type-panel-mounting-coupler.html
	if (hole_type == "f-type") {
		translate([0,0,3]) cylinder(r=4.7625, h=10, center=true);
							}

// Cat5e & Gat6 plate
// Cat5e Fits http://www.datapro.net/products/cat-5e-panel-mount-ethernet.html
// Cat6 Fits hhttp://www.datapro.net/products/cat-6-panel-mount-ethernet.html
	if (hole_type == "cat5e" || hole_type == "cat6") {
		translate([0,-12.5,3]) cylinder(r=1.75, h=10, center = true);
		translate([0,12.5,3]) cylinder(r=1.75, h=10, center = true);
		translate([0,0,3]) cube([15,15,10], center=true);
		}

// S-Video & PS2 plate
// S-Video Fits hhttp://www.datapro.net/products/cat-6-panel-mount-ethernet.html
// PS2 http://www.datapro.net/products/ps2-panel-mount-extension-cable.html
	if (hole_type == "svideo" || hole_type == "ps2") {
		translate([0,-10,3]) cylinder(r=1.75, h=10, center = true);
		translate([0,10,3]) cylinder(r=1.75, h=10, center = true);
		translate([0,0,3]) cylinder(r=5, h=10, center=true);
		}


// Stereo / 1/4" headphone jack coupler
// Stereo coupler Fits http://www.datapro.net/products/stereo-panel-mount-coupler.html
	if (hole_type == "stereo") {
		translate([0,0,3]) cylinder(r=2.985, h=10, center=true);
		}

//Keystone1 hole
//Hole for 1 Keystone Jack
	if (hole_type == "keystone1") {
		translate([0,0,5]) cube([16.5,15,10], center = true);
	}

//Keystone Solid
	if (hole_type == "keystone_solid") {
		rotate([0,0,90]) {
			difference(){
				translate([0,0,.1]) cube([23,30.5,9.8]);
					translate([4,4,0]){
						difference(){
							cube([15,22.5,10]);
							translate([-1,-0.001,3.501]) cube([17,2,6.5]);
							translate([-1,2.5,-3.40970]) rotate([45,0,0]) cube([17,2,6.5]);
							translate([-1,18.501,6.001]) cube([17,4,4]);
							translate([-1,20.5,0]) rotate([-45,0,0]) cube([17,2,6.5]);
						}
					}
				}
			}
		}

//End of module "hole"
}

  ////////////////////////
 // Number One ENGAGE: //
////////////////////////

// Rotate so it sits correctly on plate (whoops) and make upside down
rotate([0,180,90]){
// put plate at 0,0,0 for easier printing
translate([-height_sizes[plate_size]/2,-solid_plate_width/2,-6]){

if (plate_width == 1) {
	difference() {
		plate();
		translate([0,0,-3]) plate_inner();
		plate1();
			}
		union() {
		plate1_solid();
		}
			}

else if (plate_width == 2) {
difference()
{
plate();
translate([0,0,-3]) plate_inner();
plate1();
plate2();
}
union() {
		plate1_solid();
		plate2_solid();
		}
}

else if (plate_width == 3) {
difference()
{
plate();
translate([0,0,-3]) plate_inner();
plate1();
plate2();
plate3();
}
union() {
		plate1_solid();
		plate2_solid();
		plate3_solid();
		}
}

else if (plate_width == 4) {
difference()
{
plate();
translate([0,0,-3]) plate_inner();
plate1();
plate2();
plate3();
plate4();
}
union() {
		plate1_solid();
		plate2_solid();
		plate3_solid();
		plate4_solid();
		}
}

else if (plate_width == 5) {
difference()
{
plate();
translate([0,0,-3]) plate_inner();
plate1();
plate2();
plate3();
plate4();
plate5();
}
union() {
		plate1_solid();
		plate2_solid();
		plate3_solid();
		plate4_solid();
		plate5_solid();
		}
}

//End Rotate
}
//End Translate
}
